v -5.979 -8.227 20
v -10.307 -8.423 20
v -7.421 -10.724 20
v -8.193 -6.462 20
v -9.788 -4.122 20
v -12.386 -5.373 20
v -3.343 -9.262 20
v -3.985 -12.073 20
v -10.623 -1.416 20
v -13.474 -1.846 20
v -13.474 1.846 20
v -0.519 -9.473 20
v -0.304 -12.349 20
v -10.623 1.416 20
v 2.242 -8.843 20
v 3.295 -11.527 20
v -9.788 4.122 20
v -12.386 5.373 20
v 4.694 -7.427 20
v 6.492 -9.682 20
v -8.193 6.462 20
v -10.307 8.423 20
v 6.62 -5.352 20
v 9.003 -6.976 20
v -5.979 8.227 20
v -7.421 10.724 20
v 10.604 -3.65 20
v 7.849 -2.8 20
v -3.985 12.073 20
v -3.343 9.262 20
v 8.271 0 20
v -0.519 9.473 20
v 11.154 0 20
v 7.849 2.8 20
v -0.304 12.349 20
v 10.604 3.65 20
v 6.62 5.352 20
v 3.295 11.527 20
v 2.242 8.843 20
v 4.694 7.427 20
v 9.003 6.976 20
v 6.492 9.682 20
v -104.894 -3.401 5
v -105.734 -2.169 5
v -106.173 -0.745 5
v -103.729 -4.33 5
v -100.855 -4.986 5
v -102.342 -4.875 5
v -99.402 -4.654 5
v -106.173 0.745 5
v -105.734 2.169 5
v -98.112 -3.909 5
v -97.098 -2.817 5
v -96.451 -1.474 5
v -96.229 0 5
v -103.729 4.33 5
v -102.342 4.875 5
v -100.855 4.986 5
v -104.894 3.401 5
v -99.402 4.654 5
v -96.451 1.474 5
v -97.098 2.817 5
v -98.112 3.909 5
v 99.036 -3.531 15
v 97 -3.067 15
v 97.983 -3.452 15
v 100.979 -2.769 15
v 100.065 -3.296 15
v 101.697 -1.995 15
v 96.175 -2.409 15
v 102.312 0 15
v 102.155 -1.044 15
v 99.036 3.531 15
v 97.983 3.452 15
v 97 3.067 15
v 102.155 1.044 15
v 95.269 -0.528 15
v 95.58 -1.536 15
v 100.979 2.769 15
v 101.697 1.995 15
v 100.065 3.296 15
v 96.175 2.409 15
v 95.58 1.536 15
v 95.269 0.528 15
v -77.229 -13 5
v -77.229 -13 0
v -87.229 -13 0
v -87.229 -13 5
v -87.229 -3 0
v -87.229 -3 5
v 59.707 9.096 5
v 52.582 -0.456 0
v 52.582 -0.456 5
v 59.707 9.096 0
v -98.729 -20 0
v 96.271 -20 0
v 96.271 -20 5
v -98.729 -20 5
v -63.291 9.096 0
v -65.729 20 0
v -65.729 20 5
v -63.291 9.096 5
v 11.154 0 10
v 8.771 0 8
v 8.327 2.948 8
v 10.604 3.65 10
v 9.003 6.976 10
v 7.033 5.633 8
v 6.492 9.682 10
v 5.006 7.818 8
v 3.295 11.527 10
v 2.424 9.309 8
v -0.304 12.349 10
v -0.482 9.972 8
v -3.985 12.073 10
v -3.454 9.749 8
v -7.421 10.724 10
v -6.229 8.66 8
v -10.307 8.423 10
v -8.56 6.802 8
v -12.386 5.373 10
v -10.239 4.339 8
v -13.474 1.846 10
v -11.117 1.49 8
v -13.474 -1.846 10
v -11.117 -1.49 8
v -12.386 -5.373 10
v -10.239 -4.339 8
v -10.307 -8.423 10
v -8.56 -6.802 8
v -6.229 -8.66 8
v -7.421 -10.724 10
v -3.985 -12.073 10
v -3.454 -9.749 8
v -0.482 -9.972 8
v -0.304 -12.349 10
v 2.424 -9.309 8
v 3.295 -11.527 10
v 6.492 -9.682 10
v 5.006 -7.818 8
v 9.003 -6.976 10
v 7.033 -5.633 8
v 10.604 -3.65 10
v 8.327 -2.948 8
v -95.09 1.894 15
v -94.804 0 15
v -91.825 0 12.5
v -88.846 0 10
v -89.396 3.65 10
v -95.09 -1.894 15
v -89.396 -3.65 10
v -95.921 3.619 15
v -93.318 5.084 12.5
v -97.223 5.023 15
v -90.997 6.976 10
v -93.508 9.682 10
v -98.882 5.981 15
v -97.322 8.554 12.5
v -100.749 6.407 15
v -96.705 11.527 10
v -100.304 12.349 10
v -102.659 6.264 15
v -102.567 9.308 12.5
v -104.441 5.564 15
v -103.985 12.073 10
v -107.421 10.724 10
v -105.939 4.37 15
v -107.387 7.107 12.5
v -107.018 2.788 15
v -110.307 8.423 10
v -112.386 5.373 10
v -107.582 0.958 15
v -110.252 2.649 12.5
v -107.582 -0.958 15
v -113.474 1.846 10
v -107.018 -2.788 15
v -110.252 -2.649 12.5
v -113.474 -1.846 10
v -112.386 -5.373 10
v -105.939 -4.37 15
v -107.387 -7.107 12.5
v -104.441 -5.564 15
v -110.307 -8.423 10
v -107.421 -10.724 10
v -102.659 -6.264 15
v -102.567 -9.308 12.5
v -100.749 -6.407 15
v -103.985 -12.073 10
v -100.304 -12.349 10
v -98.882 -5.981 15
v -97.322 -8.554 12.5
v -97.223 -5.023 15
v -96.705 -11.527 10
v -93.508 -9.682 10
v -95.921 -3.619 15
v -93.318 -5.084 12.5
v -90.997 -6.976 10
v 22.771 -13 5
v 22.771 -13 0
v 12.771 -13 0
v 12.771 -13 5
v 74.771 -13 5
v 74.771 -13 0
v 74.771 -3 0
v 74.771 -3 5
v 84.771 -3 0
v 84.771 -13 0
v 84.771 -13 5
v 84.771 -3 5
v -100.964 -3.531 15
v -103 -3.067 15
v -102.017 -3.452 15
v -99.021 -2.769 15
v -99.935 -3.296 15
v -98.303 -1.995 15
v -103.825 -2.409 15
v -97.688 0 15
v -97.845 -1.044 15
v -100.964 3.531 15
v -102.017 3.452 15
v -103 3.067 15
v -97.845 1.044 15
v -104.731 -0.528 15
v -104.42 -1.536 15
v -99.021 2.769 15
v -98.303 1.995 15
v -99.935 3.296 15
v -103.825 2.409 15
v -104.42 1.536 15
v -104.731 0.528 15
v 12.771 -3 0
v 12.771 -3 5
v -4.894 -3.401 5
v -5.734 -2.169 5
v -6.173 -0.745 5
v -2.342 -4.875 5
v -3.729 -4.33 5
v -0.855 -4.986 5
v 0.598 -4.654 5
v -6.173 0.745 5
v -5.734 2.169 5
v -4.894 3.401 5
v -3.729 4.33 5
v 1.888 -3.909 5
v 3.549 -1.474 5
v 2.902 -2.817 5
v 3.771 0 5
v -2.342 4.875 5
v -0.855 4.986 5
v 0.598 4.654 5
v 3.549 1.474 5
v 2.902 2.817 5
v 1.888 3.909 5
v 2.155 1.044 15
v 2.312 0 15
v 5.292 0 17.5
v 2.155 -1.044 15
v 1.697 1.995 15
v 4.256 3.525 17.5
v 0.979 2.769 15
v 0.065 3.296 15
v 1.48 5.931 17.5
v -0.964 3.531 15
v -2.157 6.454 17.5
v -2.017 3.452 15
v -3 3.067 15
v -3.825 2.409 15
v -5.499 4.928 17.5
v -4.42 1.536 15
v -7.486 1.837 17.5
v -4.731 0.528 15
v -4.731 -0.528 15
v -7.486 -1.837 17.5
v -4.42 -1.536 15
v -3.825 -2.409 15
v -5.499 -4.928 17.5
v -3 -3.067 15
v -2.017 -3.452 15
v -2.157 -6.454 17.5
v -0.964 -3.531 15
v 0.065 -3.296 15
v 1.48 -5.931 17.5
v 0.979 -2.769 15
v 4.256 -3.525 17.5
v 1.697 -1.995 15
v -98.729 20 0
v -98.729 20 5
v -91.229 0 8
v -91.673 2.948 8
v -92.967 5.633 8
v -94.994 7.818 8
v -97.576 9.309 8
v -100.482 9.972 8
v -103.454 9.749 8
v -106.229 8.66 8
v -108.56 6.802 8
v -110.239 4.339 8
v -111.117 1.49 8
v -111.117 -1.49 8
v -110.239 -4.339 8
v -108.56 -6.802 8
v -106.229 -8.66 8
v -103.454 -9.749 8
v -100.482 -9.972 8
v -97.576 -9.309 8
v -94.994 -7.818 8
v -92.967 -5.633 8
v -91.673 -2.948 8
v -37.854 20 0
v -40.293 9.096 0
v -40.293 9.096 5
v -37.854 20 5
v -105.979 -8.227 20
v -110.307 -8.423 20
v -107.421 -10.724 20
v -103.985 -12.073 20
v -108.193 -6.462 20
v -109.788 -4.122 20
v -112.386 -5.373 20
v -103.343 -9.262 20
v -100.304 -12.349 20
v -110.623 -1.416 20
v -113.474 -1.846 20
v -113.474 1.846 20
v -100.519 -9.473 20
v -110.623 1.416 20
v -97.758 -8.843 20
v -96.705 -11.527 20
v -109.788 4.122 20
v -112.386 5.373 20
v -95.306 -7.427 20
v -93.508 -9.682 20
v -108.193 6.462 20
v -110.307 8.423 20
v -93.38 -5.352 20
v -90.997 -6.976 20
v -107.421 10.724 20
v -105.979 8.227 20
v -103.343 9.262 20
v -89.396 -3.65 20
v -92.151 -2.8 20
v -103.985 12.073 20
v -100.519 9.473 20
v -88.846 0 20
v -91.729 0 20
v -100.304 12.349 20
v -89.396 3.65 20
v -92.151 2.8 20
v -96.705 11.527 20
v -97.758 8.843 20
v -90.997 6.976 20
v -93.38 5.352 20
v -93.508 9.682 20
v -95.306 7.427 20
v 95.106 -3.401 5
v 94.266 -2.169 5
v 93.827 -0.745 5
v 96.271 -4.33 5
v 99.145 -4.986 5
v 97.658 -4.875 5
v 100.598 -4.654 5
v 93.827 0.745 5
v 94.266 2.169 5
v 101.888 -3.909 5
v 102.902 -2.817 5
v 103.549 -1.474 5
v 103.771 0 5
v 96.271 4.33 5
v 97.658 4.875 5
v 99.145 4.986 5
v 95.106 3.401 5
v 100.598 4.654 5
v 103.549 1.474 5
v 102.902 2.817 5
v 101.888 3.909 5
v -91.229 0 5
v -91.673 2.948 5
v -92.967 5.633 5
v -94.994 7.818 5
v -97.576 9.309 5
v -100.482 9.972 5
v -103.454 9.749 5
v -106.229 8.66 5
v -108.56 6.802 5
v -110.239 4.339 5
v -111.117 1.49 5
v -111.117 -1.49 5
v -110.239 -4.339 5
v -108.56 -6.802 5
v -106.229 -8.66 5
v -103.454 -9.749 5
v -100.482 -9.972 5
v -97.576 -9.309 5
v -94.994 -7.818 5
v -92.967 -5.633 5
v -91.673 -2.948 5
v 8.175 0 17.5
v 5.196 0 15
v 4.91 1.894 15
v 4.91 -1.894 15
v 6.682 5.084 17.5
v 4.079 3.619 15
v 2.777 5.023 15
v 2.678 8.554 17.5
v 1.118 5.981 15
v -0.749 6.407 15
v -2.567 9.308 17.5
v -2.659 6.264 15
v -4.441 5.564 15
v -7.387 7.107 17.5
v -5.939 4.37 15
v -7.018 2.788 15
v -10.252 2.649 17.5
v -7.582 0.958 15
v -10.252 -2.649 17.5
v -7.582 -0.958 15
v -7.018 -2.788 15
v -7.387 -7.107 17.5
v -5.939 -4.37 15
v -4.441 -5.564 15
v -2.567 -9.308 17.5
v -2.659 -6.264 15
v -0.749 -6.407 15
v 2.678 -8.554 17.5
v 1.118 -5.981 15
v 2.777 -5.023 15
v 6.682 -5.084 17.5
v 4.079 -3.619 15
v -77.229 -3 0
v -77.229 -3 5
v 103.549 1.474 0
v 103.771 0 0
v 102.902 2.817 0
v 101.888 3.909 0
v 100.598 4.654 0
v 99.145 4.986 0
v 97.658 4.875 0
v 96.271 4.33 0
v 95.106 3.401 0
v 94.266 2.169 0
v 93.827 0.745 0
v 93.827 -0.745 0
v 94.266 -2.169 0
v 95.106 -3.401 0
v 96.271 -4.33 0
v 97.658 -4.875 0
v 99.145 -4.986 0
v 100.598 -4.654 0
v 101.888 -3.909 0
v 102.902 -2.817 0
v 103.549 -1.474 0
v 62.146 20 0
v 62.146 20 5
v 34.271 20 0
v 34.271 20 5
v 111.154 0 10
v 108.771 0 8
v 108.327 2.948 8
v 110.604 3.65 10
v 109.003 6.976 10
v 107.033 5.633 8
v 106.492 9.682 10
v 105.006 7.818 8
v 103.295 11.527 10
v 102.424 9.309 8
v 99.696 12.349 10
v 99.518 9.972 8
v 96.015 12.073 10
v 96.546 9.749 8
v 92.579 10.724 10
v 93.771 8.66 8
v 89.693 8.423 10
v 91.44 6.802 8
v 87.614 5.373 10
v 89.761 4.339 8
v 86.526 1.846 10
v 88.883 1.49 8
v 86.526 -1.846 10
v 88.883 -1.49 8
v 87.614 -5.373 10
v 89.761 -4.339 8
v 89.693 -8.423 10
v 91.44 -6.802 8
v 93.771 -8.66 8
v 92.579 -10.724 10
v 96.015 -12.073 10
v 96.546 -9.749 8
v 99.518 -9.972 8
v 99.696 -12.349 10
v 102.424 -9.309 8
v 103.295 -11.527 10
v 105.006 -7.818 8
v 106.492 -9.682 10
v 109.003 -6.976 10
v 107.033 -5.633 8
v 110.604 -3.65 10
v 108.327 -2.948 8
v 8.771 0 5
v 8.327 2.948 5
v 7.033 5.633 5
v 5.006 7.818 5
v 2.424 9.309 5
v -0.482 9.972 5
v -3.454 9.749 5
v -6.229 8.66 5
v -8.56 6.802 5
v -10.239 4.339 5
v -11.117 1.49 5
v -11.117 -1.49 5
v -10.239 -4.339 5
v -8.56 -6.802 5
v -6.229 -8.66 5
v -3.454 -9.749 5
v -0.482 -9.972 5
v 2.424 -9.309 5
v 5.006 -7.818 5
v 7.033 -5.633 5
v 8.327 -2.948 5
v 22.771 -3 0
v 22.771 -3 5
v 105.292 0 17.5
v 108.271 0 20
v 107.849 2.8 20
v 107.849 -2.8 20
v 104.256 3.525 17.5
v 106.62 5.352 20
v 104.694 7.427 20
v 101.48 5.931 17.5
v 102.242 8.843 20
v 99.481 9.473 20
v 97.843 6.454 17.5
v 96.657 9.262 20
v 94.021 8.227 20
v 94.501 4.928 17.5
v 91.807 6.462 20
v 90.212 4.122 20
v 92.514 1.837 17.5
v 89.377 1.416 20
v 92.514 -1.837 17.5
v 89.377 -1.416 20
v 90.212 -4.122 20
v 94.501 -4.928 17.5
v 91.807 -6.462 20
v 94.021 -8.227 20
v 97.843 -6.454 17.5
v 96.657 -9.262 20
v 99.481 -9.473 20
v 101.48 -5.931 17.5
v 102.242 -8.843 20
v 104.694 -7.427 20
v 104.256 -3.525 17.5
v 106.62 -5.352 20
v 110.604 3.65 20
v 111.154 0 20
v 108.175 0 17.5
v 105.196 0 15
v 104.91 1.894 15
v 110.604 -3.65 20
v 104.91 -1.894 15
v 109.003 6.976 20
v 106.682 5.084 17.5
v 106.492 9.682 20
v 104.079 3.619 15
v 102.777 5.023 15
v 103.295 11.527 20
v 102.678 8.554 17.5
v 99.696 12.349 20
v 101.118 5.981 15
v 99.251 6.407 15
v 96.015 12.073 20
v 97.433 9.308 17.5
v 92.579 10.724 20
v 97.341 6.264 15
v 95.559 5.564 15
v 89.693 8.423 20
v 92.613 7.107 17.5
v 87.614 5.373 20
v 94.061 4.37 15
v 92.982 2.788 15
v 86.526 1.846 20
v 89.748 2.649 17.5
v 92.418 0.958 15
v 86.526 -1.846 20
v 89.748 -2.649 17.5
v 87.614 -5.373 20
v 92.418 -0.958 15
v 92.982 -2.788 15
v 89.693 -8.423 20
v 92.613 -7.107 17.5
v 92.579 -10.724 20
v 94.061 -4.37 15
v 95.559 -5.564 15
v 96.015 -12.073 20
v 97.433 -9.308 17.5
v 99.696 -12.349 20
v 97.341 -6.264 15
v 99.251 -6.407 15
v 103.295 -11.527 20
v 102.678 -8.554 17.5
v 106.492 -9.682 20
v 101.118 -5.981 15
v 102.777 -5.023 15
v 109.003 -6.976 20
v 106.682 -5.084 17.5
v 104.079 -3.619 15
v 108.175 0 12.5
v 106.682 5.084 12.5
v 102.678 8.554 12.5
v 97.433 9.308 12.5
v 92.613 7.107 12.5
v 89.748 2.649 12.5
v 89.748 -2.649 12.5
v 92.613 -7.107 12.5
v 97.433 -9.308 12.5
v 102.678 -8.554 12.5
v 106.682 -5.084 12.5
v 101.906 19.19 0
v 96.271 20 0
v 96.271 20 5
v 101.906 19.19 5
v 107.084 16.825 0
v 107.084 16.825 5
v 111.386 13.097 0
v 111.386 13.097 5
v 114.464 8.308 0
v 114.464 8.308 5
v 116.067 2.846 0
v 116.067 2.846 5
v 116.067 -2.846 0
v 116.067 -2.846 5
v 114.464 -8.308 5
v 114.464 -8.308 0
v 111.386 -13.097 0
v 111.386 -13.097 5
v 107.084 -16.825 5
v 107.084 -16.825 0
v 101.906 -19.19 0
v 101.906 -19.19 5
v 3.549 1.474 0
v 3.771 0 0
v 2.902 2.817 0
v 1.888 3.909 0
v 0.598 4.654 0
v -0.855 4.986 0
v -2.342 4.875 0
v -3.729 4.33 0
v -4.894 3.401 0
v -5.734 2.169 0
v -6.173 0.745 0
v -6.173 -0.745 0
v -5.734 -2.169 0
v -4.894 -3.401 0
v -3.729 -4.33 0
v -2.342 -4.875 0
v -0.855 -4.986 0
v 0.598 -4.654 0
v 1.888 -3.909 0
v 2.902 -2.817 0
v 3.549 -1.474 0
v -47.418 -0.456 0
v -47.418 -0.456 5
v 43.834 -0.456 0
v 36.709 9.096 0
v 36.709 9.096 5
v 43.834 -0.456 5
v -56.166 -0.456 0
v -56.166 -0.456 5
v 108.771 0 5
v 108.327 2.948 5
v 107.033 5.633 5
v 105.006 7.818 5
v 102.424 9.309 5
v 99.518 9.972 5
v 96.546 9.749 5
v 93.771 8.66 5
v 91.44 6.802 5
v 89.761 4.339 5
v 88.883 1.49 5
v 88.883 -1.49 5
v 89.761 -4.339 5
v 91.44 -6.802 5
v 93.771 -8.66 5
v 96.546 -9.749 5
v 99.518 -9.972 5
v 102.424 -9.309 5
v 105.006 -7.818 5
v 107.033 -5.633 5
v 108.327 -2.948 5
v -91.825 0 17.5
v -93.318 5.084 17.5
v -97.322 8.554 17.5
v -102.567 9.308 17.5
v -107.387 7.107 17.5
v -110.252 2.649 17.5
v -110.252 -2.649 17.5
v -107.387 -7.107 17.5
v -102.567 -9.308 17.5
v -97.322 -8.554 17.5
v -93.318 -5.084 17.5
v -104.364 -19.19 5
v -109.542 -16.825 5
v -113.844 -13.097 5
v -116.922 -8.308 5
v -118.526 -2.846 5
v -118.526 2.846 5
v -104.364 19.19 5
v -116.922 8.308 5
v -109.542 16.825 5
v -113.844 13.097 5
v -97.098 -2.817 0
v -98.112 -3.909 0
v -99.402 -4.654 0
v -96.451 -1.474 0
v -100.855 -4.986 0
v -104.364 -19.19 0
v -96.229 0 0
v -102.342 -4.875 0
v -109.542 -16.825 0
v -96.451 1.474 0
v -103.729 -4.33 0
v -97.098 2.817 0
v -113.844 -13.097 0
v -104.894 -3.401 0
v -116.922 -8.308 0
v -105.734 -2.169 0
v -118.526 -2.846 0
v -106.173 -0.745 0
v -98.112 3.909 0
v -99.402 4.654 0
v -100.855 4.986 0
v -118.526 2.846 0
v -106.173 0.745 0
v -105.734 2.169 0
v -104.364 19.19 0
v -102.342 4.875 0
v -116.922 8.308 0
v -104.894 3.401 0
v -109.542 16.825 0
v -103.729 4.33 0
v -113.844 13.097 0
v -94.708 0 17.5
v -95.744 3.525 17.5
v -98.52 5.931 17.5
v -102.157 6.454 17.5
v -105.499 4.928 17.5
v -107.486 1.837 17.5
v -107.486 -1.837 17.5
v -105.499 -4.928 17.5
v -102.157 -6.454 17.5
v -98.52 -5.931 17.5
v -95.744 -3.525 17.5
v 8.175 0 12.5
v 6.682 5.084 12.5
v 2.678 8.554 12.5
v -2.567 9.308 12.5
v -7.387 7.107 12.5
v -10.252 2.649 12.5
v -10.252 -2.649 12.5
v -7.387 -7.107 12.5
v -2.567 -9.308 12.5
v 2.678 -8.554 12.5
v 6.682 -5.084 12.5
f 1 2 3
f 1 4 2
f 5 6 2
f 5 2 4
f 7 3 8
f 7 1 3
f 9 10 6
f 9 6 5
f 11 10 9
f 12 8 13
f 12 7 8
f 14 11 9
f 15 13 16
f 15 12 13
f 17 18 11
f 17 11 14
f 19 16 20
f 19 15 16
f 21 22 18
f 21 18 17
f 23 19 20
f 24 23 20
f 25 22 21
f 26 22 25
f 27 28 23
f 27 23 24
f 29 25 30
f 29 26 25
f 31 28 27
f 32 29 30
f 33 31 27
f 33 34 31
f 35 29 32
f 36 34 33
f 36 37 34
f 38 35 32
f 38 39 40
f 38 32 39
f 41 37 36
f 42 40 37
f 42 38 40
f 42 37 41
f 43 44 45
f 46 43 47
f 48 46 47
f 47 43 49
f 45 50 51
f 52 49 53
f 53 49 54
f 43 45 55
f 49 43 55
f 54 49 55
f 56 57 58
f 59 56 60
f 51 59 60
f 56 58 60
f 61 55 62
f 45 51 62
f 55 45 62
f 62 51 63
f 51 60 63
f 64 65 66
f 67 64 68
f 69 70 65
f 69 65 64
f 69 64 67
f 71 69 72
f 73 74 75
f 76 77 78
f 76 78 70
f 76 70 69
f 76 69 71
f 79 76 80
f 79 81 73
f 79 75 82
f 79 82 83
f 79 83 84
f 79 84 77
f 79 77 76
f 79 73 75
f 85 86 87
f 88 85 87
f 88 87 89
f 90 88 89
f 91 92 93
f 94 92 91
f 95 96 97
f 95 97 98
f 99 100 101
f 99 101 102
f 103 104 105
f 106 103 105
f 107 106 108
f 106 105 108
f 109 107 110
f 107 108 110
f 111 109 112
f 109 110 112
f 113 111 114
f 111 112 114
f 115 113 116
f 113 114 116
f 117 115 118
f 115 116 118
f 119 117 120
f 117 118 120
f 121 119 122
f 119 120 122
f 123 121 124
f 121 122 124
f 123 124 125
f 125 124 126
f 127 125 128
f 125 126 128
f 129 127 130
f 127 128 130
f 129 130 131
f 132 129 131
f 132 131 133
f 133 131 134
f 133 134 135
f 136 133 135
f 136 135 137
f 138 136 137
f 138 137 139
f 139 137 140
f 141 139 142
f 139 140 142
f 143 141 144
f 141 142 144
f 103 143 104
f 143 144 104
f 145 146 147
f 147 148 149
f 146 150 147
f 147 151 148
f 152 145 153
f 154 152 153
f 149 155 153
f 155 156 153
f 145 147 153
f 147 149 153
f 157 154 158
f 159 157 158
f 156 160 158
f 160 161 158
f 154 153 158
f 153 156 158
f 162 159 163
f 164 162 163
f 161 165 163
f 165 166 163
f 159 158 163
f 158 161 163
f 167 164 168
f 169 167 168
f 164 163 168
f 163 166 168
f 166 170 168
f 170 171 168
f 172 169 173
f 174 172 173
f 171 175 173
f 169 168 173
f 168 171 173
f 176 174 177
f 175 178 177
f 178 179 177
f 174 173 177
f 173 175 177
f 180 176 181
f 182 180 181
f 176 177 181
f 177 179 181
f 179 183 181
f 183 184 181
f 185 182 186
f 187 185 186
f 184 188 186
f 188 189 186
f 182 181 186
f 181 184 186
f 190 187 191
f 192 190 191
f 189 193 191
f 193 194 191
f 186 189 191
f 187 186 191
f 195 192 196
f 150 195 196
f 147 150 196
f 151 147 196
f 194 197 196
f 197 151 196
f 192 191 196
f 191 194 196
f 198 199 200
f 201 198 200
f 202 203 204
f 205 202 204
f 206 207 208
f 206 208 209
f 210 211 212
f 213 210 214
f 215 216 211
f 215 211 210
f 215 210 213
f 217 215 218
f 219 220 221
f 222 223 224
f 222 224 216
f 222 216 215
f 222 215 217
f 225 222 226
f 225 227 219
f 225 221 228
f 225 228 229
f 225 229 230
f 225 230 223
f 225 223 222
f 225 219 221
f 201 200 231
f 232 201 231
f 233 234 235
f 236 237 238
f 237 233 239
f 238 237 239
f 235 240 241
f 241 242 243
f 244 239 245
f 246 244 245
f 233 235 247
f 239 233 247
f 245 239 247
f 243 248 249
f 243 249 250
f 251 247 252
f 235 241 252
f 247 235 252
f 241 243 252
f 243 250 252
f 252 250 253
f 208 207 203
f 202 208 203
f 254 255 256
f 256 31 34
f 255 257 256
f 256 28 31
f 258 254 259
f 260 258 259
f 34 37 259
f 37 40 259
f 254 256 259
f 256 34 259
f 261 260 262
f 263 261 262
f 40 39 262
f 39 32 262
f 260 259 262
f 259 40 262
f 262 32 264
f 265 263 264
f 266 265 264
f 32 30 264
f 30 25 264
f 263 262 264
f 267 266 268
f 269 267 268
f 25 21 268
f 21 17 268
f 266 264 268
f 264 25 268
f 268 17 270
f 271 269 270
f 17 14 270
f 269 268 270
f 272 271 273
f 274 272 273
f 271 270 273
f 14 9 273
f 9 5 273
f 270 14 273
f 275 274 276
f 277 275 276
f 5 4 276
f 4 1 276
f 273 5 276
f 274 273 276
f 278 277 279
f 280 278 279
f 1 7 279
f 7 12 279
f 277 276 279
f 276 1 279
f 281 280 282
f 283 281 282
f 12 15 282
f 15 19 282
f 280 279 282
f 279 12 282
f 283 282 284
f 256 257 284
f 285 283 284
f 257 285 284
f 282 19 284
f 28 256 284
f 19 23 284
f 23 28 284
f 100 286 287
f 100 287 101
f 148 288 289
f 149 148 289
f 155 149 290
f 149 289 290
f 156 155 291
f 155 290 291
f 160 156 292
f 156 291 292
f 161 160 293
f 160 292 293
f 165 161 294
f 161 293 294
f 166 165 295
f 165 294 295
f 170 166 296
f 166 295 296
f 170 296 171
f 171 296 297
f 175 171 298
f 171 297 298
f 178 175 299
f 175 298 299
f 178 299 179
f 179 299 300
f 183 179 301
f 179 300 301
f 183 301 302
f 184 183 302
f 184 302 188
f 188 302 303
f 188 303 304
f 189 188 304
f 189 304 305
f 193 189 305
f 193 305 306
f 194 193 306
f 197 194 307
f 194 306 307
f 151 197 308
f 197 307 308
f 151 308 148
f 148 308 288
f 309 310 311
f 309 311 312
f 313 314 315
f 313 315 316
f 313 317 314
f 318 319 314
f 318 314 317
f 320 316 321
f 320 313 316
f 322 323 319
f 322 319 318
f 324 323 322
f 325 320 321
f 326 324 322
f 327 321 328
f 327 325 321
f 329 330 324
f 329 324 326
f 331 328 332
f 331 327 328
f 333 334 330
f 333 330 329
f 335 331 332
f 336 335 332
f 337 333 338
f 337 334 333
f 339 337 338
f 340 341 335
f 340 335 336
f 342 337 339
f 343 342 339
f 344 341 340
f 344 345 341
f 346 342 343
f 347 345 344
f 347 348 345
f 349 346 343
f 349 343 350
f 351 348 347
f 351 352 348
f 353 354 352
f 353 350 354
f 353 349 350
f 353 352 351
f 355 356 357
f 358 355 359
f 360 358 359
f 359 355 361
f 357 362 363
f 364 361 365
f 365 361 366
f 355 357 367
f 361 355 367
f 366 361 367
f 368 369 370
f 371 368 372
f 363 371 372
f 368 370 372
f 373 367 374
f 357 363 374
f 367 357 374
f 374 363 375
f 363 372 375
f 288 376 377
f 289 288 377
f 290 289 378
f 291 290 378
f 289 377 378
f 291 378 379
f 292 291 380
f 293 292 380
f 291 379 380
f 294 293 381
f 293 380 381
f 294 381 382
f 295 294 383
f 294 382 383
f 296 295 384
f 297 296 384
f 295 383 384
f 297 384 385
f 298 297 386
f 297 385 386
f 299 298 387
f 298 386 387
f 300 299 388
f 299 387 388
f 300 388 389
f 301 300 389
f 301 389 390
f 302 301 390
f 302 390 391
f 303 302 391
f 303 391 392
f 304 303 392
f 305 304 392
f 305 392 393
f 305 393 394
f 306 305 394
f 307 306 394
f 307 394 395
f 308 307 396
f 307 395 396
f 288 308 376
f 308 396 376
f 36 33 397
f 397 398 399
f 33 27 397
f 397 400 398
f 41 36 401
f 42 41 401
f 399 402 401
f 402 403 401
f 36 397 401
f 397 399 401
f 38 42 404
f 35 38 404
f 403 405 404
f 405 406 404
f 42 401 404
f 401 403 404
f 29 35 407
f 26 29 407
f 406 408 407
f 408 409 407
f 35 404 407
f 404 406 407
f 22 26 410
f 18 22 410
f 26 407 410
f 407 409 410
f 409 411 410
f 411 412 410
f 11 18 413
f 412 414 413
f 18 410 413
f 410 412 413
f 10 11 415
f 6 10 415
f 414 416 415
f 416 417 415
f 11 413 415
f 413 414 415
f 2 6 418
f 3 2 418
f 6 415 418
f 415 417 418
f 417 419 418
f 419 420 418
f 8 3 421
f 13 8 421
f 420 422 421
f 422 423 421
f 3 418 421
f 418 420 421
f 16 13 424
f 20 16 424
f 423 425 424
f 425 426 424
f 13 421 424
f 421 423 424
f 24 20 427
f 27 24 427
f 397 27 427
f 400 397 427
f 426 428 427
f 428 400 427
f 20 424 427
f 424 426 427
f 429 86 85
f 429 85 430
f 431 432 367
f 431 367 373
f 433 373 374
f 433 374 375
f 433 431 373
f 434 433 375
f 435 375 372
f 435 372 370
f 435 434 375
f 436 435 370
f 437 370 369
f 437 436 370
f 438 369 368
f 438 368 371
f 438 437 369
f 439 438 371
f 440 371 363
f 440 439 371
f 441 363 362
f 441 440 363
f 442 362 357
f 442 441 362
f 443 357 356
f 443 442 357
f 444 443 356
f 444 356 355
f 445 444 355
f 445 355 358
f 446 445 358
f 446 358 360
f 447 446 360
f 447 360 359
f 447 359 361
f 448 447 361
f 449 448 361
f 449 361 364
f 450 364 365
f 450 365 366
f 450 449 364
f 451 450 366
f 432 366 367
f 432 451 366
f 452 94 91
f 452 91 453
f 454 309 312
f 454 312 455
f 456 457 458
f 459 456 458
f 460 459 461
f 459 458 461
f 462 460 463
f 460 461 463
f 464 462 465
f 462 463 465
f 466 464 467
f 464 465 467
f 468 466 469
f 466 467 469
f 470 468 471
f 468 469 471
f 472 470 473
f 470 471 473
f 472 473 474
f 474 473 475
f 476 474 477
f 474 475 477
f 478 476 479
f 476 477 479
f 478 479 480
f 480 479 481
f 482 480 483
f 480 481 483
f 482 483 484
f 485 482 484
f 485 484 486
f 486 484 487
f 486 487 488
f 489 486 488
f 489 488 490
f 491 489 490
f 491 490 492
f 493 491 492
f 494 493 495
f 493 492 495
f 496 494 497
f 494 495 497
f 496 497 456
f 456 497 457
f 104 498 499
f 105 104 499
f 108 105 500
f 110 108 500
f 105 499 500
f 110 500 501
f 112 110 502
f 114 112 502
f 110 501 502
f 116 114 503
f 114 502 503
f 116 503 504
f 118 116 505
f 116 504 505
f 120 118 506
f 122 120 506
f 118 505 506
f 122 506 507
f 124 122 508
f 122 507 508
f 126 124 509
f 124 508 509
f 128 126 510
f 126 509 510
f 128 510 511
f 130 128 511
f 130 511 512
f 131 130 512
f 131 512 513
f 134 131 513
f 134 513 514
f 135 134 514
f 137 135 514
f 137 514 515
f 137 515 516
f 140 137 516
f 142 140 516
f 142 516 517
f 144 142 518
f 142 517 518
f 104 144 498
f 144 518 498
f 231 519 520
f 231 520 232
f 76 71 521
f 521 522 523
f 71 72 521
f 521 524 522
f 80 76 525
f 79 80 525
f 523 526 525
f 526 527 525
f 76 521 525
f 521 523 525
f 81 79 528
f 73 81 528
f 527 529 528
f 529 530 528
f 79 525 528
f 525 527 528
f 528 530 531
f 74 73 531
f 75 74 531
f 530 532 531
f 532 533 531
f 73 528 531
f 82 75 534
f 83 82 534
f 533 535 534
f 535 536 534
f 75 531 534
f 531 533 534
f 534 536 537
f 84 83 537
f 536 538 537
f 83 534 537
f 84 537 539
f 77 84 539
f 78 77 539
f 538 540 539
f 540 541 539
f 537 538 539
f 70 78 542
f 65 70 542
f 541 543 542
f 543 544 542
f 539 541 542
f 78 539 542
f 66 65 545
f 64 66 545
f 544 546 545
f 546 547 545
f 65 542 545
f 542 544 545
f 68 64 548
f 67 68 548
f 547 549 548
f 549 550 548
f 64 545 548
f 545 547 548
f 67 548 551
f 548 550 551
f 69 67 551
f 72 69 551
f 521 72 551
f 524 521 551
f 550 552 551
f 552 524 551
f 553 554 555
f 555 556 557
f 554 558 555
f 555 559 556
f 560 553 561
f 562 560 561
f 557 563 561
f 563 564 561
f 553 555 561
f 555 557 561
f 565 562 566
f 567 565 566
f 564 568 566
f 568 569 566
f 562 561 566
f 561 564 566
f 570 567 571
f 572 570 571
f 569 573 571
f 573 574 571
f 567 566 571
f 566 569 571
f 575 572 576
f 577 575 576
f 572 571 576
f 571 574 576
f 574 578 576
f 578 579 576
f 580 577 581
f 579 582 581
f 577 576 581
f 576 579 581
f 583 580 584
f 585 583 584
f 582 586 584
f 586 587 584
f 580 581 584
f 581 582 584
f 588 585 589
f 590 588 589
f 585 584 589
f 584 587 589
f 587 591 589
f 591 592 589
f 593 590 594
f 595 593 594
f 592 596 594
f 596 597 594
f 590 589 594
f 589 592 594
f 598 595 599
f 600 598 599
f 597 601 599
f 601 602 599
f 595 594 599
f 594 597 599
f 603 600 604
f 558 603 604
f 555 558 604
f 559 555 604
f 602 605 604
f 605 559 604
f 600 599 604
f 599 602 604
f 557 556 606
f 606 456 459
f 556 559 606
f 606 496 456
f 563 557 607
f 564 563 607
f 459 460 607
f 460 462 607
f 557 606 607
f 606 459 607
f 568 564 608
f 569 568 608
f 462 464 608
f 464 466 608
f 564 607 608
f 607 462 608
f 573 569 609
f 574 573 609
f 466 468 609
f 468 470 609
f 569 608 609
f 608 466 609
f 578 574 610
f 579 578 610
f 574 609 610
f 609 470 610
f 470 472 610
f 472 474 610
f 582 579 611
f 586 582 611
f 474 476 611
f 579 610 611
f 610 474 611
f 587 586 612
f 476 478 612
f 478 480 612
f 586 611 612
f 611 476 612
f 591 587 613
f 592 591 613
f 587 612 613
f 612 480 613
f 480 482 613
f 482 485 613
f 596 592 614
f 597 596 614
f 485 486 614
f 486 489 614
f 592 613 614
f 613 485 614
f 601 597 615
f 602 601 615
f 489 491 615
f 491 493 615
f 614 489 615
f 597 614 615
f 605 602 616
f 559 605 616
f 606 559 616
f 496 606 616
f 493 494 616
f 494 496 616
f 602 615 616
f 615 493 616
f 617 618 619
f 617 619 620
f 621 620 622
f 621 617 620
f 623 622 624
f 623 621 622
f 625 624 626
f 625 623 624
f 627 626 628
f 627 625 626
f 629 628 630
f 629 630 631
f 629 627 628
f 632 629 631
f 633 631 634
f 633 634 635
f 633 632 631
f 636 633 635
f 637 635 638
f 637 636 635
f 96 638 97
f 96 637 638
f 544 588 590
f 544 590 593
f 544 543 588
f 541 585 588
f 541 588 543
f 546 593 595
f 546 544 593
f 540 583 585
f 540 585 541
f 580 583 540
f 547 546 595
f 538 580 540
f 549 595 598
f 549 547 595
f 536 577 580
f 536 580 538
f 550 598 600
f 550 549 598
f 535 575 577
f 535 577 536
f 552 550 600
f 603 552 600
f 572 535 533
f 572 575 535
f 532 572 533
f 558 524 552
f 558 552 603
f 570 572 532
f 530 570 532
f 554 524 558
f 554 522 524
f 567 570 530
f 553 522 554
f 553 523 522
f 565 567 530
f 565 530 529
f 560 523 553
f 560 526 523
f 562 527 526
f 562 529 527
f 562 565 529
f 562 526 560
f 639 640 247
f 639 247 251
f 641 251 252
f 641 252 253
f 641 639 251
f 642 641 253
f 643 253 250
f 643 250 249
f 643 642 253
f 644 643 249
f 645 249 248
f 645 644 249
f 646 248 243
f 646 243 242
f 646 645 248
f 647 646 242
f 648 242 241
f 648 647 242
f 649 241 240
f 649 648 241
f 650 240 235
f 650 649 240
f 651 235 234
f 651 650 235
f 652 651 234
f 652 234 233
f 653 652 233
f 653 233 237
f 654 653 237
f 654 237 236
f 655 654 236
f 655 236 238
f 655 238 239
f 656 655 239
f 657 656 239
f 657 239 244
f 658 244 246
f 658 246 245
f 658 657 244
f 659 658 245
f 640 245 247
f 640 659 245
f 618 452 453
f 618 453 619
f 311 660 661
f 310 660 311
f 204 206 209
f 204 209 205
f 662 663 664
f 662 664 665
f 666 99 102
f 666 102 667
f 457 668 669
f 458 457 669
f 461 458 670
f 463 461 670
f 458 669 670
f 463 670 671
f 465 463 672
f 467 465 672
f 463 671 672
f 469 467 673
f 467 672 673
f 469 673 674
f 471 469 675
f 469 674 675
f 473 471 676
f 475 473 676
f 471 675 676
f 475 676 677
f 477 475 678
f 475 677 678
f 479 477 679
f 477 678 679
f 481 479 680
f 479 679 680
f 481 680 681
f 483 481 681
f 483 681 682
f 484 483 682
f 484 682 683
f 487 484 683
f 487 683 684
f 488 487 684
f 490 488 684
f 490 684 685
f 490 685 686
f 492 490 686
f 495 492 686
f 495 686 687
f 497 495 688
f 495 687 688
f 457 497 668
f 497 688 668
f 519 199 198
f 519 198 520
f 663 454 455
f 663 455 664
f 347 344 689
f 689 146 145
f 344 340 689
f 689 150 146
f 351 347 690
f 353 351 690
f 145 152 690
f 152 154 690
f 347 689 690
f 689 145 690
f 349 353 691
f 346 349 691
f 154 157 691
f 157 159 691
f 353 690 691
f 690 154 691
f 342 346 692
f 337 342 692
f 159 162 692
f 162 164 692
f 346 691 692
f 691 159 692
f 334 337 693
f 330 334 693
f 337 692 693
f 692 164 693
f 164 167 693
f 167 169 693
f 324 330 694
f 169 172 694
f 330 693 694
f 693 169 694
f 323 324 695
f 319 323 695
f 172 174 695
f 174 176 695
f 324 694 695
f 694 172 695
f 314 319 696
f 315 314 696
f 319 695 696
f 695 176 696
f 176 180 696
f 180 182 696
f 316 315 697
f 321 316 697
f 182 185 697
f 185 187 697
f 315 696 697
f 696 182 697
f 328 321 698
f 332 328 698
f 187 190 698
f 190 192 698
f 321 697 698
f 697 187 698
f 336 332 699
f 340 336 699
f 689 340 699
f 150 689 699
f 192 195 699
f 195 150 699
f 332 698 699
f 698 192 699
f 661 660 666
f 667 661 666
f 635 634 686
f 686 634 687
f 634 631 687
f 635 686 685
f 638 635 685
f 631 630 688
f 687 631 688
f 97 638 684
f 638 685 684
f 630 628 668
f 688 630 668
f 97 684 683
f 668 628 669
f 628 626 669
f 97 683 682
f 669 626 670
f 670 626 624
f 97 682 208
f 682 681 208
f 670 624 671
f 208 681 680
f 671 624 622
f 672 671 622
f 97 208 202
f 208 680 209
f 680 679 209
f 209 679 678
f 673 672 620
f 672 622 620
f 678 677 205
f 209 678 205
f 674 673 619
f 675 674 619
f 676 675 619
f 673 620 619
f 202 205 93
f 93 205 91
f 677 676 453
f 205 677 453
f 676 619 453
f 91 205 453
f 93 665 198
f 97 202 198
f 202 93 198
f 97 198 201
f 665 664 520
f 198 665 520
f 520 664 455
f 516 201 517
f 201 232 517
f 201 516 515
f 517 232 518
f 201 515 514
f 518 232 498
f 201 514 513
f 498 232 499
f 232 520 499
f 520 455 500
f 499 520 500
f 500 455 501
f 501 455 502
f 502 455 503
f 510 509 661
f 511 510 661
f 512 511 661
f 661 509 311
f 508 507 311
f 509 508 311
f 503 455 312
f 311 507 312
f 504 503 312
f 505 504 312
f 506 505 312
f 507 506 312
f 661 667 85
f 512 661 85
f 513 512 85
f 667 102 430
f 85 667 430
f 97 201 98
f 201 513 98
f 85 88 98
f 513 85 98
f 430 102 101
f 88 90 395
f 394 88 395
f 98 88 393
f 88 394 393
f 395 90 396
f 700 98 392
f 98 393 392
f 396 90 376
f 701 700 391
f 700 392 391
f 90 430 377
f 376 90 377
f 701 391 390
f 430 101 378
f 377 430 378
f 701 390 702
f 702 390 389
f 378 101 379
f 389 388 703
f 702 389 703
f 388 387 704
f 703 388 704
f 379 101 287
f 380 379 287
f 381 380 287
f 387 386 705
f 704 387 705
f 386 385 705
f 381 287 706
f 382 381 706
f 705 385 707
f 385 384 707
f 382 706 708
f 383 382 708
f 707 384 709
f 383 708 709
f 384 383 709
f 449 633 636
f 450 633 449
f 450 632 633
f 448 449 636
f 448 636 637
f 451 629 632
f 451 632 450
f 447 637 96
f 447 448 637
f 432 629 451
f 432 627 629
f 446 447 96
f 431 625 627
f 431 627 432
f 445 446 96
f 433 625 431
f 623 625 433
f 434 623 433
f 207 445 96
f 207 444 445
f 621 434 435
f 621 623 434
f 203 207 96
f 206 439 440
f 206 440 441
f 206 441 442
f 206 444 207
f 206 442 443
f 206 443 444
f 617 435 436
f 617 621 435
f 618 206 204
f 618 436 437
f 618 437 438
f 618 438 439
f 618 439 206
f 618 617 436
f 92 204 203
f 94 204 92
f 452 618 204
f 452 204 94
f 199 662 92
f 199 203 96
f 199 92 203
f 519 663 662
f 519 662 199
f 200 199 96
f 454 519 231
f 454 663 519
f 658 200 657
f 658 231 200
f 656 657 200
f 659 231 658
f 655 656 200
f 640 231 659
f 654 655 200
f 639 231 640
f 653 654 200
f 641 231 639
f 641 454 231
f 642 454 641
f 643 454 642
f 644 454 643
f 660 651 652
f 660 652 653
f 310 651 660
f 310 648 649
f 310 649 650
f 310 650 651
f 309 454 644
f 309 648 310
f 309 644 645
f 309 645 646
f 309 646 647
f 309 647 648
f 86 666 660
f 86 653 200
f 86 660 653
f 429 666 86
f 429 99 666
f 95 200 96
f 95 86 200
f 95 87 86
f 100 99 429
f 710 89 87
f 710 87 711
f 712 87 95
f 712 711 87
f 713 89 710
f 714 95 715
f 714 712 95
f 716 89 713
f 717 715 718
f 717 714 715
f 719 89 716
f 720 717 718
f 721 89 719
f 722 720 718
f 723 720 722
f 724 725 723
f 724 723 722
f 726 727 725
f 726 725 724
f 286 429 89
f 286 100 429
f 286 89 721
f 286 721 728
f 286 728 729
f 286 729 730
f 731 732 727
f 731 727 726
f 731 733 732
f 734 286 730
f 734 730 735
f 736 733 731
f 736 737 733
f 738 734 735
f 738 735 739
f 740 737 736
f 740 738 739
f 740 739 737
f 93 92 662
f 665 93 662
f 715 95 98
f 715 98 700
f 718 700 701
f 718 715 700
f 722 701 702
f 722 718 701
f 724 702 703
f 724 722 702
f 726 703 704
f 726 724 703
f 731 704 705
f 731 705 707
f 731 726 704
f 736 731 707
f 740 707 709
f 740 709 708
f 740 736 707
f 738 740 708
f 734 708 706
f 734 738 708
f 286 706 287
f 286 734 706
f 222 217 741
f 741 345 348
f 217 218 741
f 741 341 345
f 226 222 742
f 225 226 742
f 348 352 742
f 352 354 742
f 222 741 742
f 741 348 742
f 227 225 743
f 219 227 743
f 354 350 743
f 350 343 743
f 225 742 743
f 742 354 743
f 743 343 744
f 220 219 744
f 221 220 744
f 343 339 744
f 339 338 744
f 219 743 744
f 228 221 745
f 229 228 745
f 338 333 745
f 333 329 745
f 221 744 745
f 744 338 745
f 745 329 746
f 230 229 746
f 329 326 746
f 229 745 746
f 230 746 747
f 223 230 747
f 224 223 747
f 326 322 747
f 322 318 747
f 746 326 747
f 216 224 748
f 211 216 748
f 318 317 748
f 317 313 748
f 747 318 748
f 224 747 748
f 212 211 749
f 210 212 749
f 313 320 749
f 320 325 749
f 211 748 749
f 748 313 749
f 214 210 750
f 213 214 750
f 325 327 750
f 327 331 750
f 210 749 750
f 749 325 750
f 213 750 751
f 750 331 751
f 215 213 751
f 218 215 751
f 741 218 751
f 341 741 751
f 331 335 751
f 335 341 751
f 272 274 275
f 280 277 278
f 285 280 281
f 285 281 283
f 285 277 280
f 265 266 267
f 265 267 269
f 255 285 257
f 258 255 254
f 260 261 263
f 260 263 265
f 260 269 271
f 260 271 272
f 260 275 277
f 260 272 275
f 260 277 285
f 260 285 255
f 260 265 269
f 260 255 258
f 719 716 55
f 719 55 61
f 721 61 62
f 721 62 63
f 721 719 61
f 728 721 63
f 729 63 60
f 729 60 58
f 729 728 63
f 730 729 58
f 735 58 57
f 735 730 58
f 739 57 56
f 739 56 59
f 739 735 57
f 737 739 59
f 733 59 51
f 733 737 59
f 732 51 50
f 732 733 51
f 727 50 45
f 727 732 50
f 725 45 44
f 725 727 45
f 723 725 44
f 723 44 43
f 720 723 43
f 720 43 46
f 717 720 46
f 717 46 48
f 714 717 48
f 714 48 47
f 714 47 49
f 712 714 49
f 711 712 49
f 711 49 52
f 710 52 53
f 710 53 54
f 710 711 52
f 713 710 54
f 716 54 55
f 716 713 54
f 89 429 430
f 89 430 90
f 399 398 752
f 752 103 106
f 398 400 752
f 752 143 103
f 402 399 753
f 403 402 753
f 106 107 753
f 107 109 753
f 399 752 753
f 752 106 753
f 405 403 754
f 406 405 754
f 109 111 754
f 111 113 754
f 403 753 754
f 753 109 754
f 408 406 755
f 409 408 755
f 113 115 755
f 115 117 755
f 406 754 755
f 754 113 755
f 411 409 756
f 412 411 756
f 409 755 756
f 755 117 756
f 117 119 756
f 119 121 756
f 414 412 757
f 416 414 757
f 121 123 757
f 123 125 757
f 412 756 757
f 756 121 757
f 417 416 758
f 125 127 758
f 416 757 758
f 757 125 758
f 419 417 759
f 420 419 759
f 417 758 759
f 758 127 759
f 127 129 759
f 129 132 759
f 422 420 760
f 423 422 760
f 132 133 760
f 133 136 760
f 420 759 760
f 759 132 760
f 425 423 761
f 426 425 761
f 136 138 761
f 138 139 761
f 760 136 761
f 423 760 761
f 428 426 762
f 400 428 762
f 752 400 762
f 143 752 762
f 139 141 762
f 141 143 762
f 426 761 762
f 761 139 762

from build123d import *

# Parameters (mm, degrees)
ESQUISSE1_R                       = 5
BOSS_EXTRU_1_DEPTH                = 5
ESQUISSE2_R                       = 10
BOSS_EXTRU_2_DEPTH                = 3
ESQUISSE3_R                       = 10
BOSS_EXTRU_3_DEPTH                = 2
BOSS_EXTRU_3_DRAFT                = -50
BOSS_EXTRU_3_PROFILE_2_DEPTH      = 2
BOSS_EXTRU_3_PROFILE_2_DRAFT      = -50
BOSS_EXTRU_3_PROFILE_3_DEPTH      = 2
BOSS_EXTRU_3_PROFILE_3_DRAFT      = -50
ESQUISSE4_R                       = 12.383507185
BOSS_EXTRU_4_DEPTH                = 5
BOSS_EXTRU_4_DRAFT                = 50
BOSS_EXTRU_4_PROFILE_2_DEPTH      = 5
BOSS_EXTRU_4_PROFILE_2_DRAFT      = 50
BOSS_EXTRU_4_PROFILE_3_DEPTH      = 5
BOSS_EXTRU_4_PROFILE_3_DRAFT      = 50
ESQUISSE5_R                       = 6.424739222
BOSS_EXTRU_5_DEPTH                = 5
BOSS_EXTRU_5_DRAFT                = -50
BOSS_EXTRU_5_PROFILE_2_DEPTH      = 5
BOSS_EXTRU_5_PROFILE_2_DRAFT      = -50
BOSS_EXTRU_5_PROFILE_3_DEPTH      = 5
BOSS_EXTRU_5_PROFILE_3_DRAFT      = -50
ESQUISSE6_R                       = 9.5
ENL_V_MAT_EXTRU_1_DEPTH           = 5
ENL_V_MAT_EXTRU_1_DRAFT           = -50
ENL_V_MAT_EXTRU_1_PROFILE_2_DEPTH = 5
ENL_V_MAT_EXTRU_1_PROFILE_2_DRAFT = -50
ENL_V_MAT_EXTRU_1_PROFILE_3_DEPTH = 5
ENL_V_MAT_EXTRU_1_PROFILE_3_DRAFT = -50
ESQUISSE7_W                       = 10
ESQUISSE7_H                       = 10
ENL_V_MAT_EXTRU_2_DEPTH           = 10


with BuildPart() as part:
    # Esquisse1 → Boss.-Extru.1 (new body)
    with BuildSketch(Plane.XY):
        with BuildLine():
            Line((-98.729079498, 20), (96.270920502, 20))
            ThreePointArc((96.270920502, 20), (116.270920502, 0), (96.270920502, -20))
            Line((96.270920502, -20), (-98.729079498, -20))
            ThreePointArc((-98.729079498, -20), (-118.729079498, 0), (-98.729079498, 20))
        make_face()
        with Locations((-101.229079498, 0)):
            Circle(ESQUISSE1_R, mode=Mode.SUBTRACT)
        with Locations((-1.229079498, 0)):
            Circle(ESQUISSE1_R, mode=Mode.SUBTRACT)
        with Locations((98.770920502, 0)):
            Circle(ESQUISSE1_R, mode=Mode.SUBTRACT)
    extrude(amount=BOSS_EXTRU_1_DEPTH)

    # Esquisse2 → Boss.-Extru.2 (add)
    with BuildSketch(Plane.XY.offset(5)):
        with Locations((-101.229079498, 0)):
            Circle(ESQUISSE2_R)
        with Locations((-1.229079498, 0)):
            Circle(ESQUISSE2_R)
        with Locations((98.770920502, 0)):
            Circle(ESQUISSE2_R)
    extrude(amount=BOSS_EXTRU_2_DEPTH)


with BuildPart() as boss_extru_3_tool:
    # Esquisse3 → Boss.-Extru.3 (with draft: the straight prism first)
    with BuildSketch(Plane.XY.offset(8)):
        with Locations((-101.229079498, 0)):
            Circle(ESQUISSE3_R)
    extrude(amount=BOSS_EXTRU_3_DEPTH)
    # Boss.-Extru.3: the draft: its side faces are tilted about the plane it starts from
    boss_extru_3_sides = [boss_extru_3_tool.faces().sort_by_distance(p)[0] for p in [
        (-111.229079498, 0, 9),
    ]]
    draft(boss_extru_3_sides, Plane.XY.offset(8), BOSS_EXTRU_3_DRAFT)


with BuildPart() as part_1:
    add(part.part)

    # Boss.-Extru.3: add boss_extru_3_tool
    add(boss_extru_3_tool.part)


with BuildPart() as boss_extru_3_profile_2_tool:
    # Esquisse3 → Boss.-Extru.3 profile 2 (with draft: the straight prism first)
    with BuildSketch(Plane.XY.offset(8)):
        with Locations((-1.229079498, 0)):
            Circle(ESQUISSE3_R)
    extrude(amount=BOSS_EXTRU_3_PROFILE_2_DEPTH)
    # Boss.-Extru.3 profile 2: the draft: its side faces are tilted about the plane it starts from
    boss_extru_3_profile_2_sides = [boss_extru_3_profile_2_tool.faces().sort_by_distance(p)[0] for p in [
        (-11.229079498, 0, 9),
    ]]
    draft(boss_extru_3_profile_2_sides, Plane.XY.offset(8), BOSS_EXTRU_3_PROFILE_2_DRAFT)


with BuildPart() as part_2:
    add(part_1.part)

    # Boss.-Extru.3 profile 2: add boss_extru_3_profile_2_tool
    add(boss_extru_3_profile_2_tool.part)


with BuildPart() as boss_extru_3_profile_3_tool:
    # Esquisse3 → Boss.-Extru.3 profile 3 (with draft: the straight prism first)
    with BuildSketch(Plane.XY.offset(8)):
        with Locations((98.770920502, 0)):
            Circle(ESQUISSE3_R)
    extrude(amount=BOSS_EXTRU_3_PROFILE_3_DEPTH)
    # Boss.-Extru.3 profile 3: the draft: its side faces are tilted about the plane it starts from
    boss_extru_3_profile_3_sides = [boss_extru_3_profile_3_tool.faces().sort_by_distance(p)[0] for p in [
        (88.770920502, 0, 9),
    ]]
    draft(boss_extru_3_profile_3_sides, Plane.XY.offset(8), BOSS_EXTRU_3_PROFILE_3_DRAFT)


with BuildPart() as part_3:
    add(part_2.part)

    # Boss.-Extru.3 profile 3: add boss_extru_3_profile_3_tool
    add(boss_extru_3_profile_3_tool.part)


with BuildPart() as boss_extru_4_tool:
    # Esquisse4 → Boss.-Extru.4 (with draft: the straight prism first)
    with BuildSketch(Plane.XY.offset(10)):
        with Locations((-101.229079498, 0)):
            Circle(ESQUISSE4_R)
    extrude(amount=BOSS_EXTRU_4_DEPTH)
    # Boss.-Extru.4: the draft: its side faces are tilted about the plane it starts from
    boss_extru_4_sides = [boss_extru_4_tool.faces().sort_by_distance(p)[0] for p in [
        (-113.612586683, 0, 12.5),
    ]]
    draft(boss_extru_4_sides, Plane.XY.offset(10), BOSS_EXTRU_4_DRAFT)


with BuildPart() as part_4:
    add(part_3.part)

    # Boss.-Extru.4: add boss_extru_4_tool
    add(boss_extru_4_tool.part)


with BuildPart() as boss_extru_4_profile_2_tool:
    # Esquisse4 → Boss.-Extru.4 profile 2 (with draft: the straight prism first)
    with BuildSketch(Plane.XY.offset(10)):
        with Locations((-1.229079498, 0)):
            Circle(ESQUISSE4_R)
    extrude(amount=BOSS_EXTRU_4_PROFILE_2_DEPTH)
    # Boss.-Extru.4 profile 2: the draft: its side faces are tilted about the plane it starts from
    boss_extru_4_profile_2_sides = [boss_extru_4_profile_2_tool.faces().sort_by_distance(p)[0] for p in [
        (-13.612586683, 0, 12.5),
    ]]
    draft(boss_extru_4_profile_2_sides, Plane.XY.offset(10), BOSS_EXTRU_4_PROFILE_2_DRAFT)


with BuildPart() as part_5:
    add(part_4.part)

    # Boss.-Extru.4 profile 2: add boss_extru_4_profile_2_tool
    add(boss_extru_4_profile_2_tool.part)


with BuildPart() as boss_extru_4_profile_3_tool:
    # Esquisse4 → Boss.-Extru.4 profile 3 (with draft: the straight prism first)
    with BuildSketch(Plane.XY.offset(10)):
        with Locations((98.770920502, 0)):
            Circle(ESQUISSE4_R)
    extrude(amount=BOSS_EXTRU_4_PROFILE_3_DEPTH)
    # Boss.-Extru.4 profile 3: the draft: its side faces are tilted about the plane it starts from
    boss_extru_4_profile_3_sides = [boss_extru_4_profile_3_tool.faces().sort_by_distance(p)[0] for p in [
        (86.387413317, 0, 12.5),
    ]]
    draft(boss_extru_4_profile_3_sides, Plane.XY.offset(10), BOSS_EXTRU_4_PROFILE_3_DRAFT)


with BuildPart() as part_6:
    add(part_5.part)

    # Boss.-Extru.4 profile 3: add boss_extru_4_profile_3_tool
    add(boss_extru_4_profile_3_tool.part)


with BuildPart() as boss_extru_5_tool:
    # Esquisse5 → Boss.-Extru.5 (with draft: the straight prism first)
    with BuildSketch(Plane.XY.offset(15)):
        with Locations((-101.229079498, 0)):
            Circle(ESQUISSE5_R)
    extrude(amount=BOSS_EXTRU_5_DEPTH)
    # Boss.-Extru.5: the draft: its side faces are tilted about the plane it starts from
    boss_extru_5_sides = [boss_extru_5_tool.faces().sort_by_distance(p)[0] for p in [
        (-107.65381872, 0, 17.5),
    ]]
    draft(boss_extru_5_sides, Plane.XY.offset(15), BOSS_EXTRU_5_DRAFT)


with BuildPart() as part_7:
    add(part_6.part)

    # Boss.-Extru.5: add boss_extru_5_tool
    add(boss_extru_5_tool.part)


with BuildPart() as boss_extru_5_profile_2_tool:
    # Esquisse5 → Boss.-Extru.5 profile 2 (with draft: the straight prism first)
    with BuildSketch(Plane.XY.offset(15)):
        with Locations((-1.229079498, 0)):
            Circle(ESQUISSE5_R)
    extrude(amount=BOSS_EXTRU_5_PROFILE_2_DEPTH)
    # Boss.-Extru.5 profile 2: the draft: its side faces are tilted about the plane it starts from
    boss_extru_5_profile_2_sides = [boss_extru_5_profile_2_tool.faces().sort_by_distance(p)[0] for p in [
        (-7.65381872, 0, 17.5),
    ]]
    draft(boss_extru_5_profile_2_sides, Plane.XY.offset(15), BOSS_EXTRU_5_PROFILE_2_DRAFT)


with BuildPart() as part_8:
    add(part_7.part)

    # Boss.-Extru.5 profile 2: add boss_extru_5_profile_2_tool
    add(boss_extru_5_profile_2_tool.part)


with BuildPart() as boss_extru_5_profile_3_tool:
    # Esquisse5 → Boss.-Extru.5 profile 3 (with draft: the straight prism first)
    with BuildSketch(Plane.XY.offset(15)):
        with Locations((98.770920502, 0)):
            Circle(ESQUISSE5_R)
    extrude(amount=BOSS_EXTRU_5_PROFILE_3_DEPTH)
    # Boss.-Extru.5 profile 3: the draft: its side faces are tilted about the plane it starts from
    boss_extru_5_profile_3_sides = [boss_extru_5_profile_3_tool.faces().sort_by_distance(p)[0] for p in [
        (92.34618128, 0, 17.5),
    ]]
    draft(boss_extru_5_profile_3_sides, Plane.XY.offset(15), BOSS_EXTRU_5_PROFILE_3_DRAFT)


with BuildPart() as part_9:
    add(part_8.part)

    # Boss.-Extru.5 profile 3: add boss_extru_5_profile_3_tool
    add(boss_extru_5_profile_3_tool.part)


with BuildPart() as enl_v_mat_extru_1_tool:
    # Esquisse6 → Enlèv. mat.-Extru.1 (with draft: the straight prism first)
    with BuildSketch(Plane.XY.offset(20)):
        with Locations((-101.229079498, 0)):
            Circle(ESQUISSE6_R)
    extrude(amount=-ENL_V_MAT_EXTRU_1_DEPTH)
    # Enlèv. mat.-Extru.1: the draft: its side faces are tilted about the plane it starts from
    enl_v_mat_extru_1_sides = [enl_v_mat_extru_1_tool.faces().sort_by_distance(p)[0] for p in [
        (-110.729079498, 0, 17.5),
    ]]
    draft(enl_v_mat_extru_1_sides, Plane.XY.offset(20), ENL_V_MAT_EXTRU_1_DRAFT)


with BuildPart() as part_10:
    add(part_9.part)

    # Enlèv. mat.-Extru.1: cut by enl_v_mat_extru_1_tool
    add(enl_v_mat_extru_1_tool.part, mode=Mode.SUBTRACT)


with BuildPart() as enl_v_mat_extru_1_profile_2_tool:
    # Esquisse6 → Enlèv. mat.-Extru.1 profile 2 (with draft: the straight prism first)
    with BuildSketch(Plane.XY.offset(20)):
        with Locations((-1.229079498, 0)):
            Circle(ESQUISSE6_R)
    extrude(amount=-ENL_V_MAT_EXTRU_1_PROFILE_2_DEPTH)
    # Enlèv. mat.-Extru.1 profile 2: the draft: its side faces are tilted about the plane it starts from
    enl_v_mat_extru_1_profile_2_sides = [enl_v_mat_extru_1_profile_2_tool.faces().sort_by_distance(p)[0] for p in [
        (-10.729079498, 0, 17.5),
    ]]
    draft(enl_v_mat_extru_1_profile_2_sides, Plane.XY.offset(20), ENL_V_MAT_EXTRU_1_PROFILE_2_DRAFT)


with BuildPart() as part_11:
    add(part_10.part)

    # Enlèv. mat.-Extru.1 profile 2: cut by enl_v_mat_extru_1_profile_2_tool
    add(enl_v_mat_extru_1_profile_2_tool.part, mode=Mode.SUBTRACT)


with BuildPart() as enl_v_mat_extru_1_profile_3_tool:
    # Esquisse6 → Enlèv. mat.-Extru.1 profile 3 (with draft: the straight prism first)
    with BuildSketch(Plane.XY.offset(20)):
        with Locations((98.770920502, 0)):
            Circle(ESQUISSE6_R)
    extrude(amount=-ENL_V_MAT_EXTRU_1_PROFILE_3_DEPTH)
    # Enlèv. mat.-Extru.1 profile 3: the draft: its side faces are tilted about the plane it starts from
    enl_v_mat_extru_1_profile_3_sides = [enl_v_mat_extru_1_profile_3_tool.faces().sort_by_distance(p)[0] for p in [
        (89.270920502, 0, 17.5),
    ]]
    draft(enl_v_mat_extru_1_profile_3_sides, Plane.XY.offset(20), ENL_V_MAT_EXTRU_1_PROFILE_3_DRAFT)


with BuildPart() as part_12:
    add(part_11.part)

    # Enlèv. mat.-Extru.1 profile 3: cut by enl_v_mat_extru_1_profile_3_tool
    add(enl_v_mat_extru_1_profile_3_tool.part, mode=Mode.SUBTRACT)

    # Esquisse7 → Enlèv. mat.-Extru.2 (cut)
    with BuildSketch(Plane(origin=(0, 0, 0), x_dir=(-1, 0, 0), z_dir=(0, 0, -1))):
        with Locations((-79.770920502, -8)):
            Rectangle(ESQUISSE7_W, ESQUISSE7_H)
        Polygon((65.729079498, 20), (63.290744845, 9.096400069), (56.165717759, -0.455876038), (51.791778882, -0.455876038), (47.417840004, -0.455876038), (40.292812918, 9.096400069), (37.854478265, 20), align=None)
        with Locations((-17.770920502, -8)):
            Rectangle(ESQUISSE7_W, ESQUISSE7_H)
        with Locations((82.229079498, -8)):
            Rectangle(ESQUISSE7_W, ESQUISSE7_H)
        Polygon((-36.709255155, 9.096400069), (-43.834282241, -0.455876038), (-48.208221118, -0.455876038), (-52.582159996, -0.455876038), (-59.707187082, 9.096400069), (-62.145521735, 20), (-34.270920502, 20), align=None)
    extrude(amount=-ENL_V_MAT_EXTRU_2_DEPTH, mode=Mode.SUBTRACT)


solid = part_12.part
